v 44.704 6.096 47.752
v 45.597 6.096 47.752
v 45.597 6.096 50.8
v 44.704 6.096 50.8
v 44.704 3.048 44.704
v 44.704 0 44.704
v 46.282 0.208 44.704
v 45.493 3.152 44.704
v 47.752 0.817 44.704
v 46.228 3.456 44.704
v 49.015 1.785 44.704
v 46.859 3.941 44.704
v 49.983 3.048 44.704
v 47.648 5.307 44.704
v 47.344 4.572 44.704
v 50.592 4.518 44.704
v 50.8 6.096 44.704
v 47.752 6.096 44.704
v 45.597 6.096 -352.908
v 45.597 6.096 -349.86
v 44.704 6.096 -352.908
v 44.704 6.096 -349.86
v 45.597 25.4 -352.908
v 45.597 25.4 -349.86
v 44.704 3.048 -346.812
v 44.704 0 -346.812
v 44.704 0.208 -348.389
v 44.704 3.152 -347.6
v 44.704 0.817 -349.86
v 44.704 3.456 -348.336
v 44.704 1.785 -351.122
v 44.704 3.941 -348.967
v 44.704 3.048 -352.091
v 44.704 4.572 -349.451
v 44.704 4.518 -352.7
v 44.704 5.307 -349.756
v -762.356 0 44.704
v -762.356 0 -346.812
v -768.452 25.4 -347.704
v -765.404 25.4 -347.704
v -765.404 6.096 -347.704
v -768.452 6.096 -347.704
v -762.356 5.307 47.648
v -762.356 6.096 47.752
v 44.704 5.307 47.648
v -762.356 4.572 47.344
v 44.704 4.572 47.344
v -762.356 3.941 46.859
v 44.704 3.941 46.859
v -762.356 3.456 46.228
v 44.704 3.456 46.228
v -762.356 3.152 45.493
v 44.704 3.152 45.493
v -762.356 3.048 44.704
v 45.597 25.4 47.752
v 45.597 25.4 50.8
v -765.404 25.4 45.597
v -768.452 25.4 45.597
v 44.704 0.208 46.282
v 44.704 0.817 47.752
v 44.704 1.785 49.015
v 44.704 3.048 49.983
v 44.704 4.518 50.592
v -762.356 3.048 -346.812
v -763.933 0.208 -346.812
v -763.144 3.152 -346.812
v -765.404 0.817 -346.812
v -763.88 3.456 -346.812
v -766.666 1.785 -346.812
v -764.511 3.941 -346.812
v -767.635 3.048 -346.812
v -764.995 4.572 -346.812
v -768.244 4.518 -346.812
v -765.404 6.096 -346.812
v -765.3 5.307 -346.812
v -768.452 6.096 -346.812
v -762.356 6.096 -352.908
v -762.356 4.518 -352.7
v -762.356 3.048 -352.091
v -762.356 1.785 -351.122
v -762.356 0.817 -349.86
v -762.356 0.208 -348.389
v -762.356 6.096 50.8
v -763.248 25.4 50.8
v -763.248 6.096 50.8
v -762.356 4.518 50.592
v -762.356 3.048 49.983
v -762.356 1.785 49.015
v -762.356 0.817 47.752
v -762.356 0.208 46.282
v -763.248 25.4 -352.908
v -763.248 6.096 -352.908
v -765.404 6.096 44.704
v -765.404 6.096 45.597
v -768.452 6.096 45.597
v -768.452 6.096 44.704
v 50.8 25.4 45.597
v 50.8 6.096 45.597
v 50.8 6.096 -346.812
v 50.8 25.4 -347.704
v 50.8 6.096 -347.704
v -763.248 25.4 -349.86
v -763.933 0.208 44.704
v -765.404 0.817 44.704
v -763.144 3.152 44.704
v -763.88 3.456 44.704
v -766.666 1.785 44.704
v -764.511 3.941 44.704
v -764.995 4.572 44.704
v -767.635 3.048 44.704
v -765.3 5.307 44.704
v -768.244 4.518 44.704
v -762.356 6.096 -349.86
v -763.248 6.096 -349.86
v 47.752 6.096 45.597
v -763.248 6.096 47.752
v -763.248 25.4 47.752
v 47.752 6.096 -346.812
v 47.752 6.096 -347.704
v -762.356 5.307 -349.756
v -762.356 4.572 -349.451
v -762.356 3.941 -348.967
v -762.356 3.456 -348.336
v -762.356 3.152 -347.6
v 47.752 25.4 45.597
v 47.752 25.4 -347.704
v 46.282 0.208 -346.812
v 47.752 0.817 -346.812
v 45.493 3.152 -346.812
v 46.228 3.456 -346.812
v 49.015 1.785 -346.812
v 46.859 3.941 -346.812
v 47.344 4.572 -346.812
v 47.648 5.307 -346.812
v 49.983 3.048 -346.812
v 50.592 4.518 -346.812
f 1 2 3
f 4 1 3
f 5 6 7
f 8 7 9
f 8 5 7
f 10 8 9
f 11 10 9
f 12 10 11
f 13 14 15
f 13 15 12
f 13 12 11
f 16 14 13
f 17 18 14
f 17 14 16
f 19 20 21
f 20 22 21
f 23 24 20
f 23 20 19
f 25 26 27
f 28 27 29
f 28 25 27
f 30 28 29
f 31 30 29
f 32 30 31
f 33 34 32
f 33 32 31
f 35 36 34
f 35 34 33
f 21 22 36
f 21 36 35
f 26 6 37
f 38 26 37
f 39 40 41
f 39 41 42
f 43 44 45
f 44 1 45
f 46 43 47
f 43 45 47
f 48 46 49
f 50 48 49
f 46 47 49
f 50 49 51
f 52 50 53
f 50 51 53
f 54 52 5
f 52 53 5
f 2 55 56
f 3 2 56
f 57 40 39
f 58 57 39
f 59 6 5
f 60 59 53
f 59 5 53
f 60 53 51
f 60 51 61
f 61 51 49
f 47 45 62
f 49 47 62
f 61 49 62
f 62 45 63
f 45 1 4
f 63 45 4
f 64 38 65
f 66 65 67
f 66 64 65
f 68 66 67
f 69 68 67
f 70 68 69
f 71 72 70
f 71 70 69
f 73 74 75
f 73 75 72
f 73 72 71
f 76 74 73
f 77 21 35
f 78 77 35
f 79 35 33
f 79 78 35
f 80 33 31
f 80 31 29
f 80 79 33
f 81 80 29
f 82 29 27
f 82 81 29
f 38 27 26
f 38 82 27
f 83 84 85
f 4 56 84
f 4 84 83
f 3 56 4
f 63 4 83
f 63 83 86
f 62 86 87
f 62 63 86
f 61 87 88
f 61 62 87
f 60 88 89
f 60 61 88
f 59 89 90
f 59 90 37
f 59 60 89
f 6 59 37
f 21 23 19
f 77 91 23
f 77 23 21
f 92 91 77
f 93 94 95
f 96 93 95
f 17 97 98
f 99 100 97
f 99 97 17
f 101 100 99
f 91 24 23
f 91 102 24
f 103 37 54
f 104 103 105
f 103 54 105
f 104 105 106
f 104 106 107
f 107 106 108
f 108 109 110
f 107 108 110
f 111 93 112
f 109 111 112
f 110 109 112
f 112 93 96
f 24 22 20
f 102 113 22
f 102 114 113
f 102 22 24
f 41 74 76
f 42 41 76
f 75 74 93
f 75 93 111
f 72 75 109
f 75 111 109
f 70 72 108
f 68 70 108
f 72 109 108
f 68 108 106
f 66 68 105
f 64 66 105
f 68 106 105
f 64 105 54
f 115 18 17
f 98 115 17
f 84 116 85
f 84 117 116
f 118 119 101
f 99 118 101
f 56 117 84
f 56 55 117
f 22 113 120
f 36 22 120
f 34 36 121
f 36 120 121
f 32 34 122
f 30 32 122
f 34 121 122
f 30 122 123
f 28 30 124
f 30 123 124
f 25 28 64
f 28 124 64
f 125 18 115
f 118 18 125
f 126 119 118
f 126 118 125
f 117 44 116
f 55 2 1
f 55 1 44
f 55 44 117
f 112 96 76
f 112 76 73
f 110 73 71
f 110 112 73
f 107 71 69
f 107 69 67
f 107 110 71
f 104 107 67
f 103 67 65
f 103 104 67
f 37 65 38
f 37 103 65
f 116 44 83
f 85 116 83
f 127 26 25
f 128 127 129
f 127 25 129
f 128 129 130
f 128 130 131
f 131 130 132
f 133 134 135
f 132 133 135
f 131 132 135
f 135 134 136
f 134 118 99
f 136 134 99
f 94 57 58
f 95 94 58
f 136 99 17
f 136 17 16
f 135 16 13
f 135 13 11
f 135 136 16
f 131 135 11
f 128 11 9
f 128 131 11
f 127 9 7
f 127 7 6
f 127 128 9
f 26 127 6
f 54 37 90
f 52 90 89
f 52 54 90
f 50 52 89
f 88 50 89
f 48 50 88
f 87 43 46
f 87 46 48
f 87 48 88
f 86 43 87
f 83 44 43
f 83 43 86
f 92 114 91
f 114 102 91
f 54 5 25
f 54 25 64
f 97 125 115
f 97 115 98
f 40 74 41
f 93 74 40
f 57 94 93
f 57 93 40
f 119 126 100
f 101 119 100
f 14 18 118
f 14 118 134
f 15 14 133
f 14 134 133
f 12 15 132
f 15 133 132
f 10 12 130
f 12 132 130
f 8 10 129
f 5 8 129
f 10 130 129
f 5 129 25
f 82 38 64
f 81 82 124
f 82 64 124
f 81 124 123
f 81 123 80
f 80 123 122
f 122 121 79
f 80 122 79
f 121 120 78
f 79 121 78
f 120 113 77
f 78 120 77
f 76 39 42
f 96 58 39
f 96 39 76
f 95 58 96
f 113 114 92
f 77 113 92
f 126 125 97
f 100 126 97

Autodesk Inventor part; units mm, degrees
ref_plane "YZ Plane" through (0, 0, 0) normal (1, 0, 0) x (0, 1, 0)
ref_plane "XZ Plane" through (0, 0, 0) normal (0, 1, 0) x (-1, 0, 0)
ref_plane "XY Plane" through (0, 0, 0) normal (0, 0, 1) x (1, 0, 0)
sketch "Sketch1" plane through (0, 0, 0) normal (0, 1, 0) x (-1, 0, 0)
  line L0 (-50.8, 50.8) -> (768.4516, 50.8)
  line L1 (768.4516, 50.8) -> (768.4516, -352.9076)
  line L2 (768.4516, -352.9076) -> (-50.8, -352.9076)
  line L3 (-50.8, -352.9076) -> (-50.8, 50.8)
  dimension "d48" = 819.2516
  dimension "d49" = 403.7076
extrude "Plate1" add sketch "Sketch1" along normal blind 3.048
sketch "Sketch2" plane through (-768.4516, 0, -349.8596) normal (0, 0, -1) x (-1, 0, 0)
  line L0 (-819.2516, 0) -> (0, 0)
  line L1 (0, 0) -> (0, 25.4)
  line L2 (0, 25.4) -> (-819.2516, 25.4)
  line L3 (-819.2516, 25.4) -> (-819.2516, 0)
edge flange "Flange1" height 25.4 angle 90 thickness 3.048 bend radius 3.048 thickness toward (0, 0, -1) relief tear relief width 3.048 relief depth 1.524 corner gap 3.048 corner form 2 edges at (-358.8258, 3.048, -352.9076) (-768.4516, 3.048, -151.0538) (-358.8258, 3.048, 50.8) (50.8, 3.048, -151.0538) wall of the first edge with corners at (50.8, 0, -349.8596) (-768.4516, 0, -349.8596) (-768.4516, 25.4, -349.8596) (50.8, 25.4, -349.8596)
bend "Bend1"
corner "Corner1"
equation "\"d50\" = BendReliefWidth"
equation "\"d51\" = BendReliefDepth"
equation "\"d52\" = MinimumRemnant"
equation "\"d53\" = BendRadius"
equation "\"d56\" = BendRadius"
equation "\"d57\" = CornerReliefSize"
equation "\"d58\" = GapSize"
equation "\"d59\" = JacobiRadiusSize"
equation "\"BendRadius\" = Thickness"
equation "\"BendReliefWidth\" = Thickness"
equation "\"BendReliefDepth\" = 0.5 * Thickness"
equation "\"CornerReliefSize\" = 4 * Thickness"
equation "\"MinimumRemnant\" = 2 * Thickness"
equation "\"TransitionRadius\" = BendRadius"
equation "\"JacobiRadiusSize\" = BendRadius"
equation "\"GapSize\" = Thickness"
equation "\"d47\" = BendRadius"
equation "\"Thickness\" = 3.048"
properties part number "BellyPan Lexan" material "Polycarbonate, Clear"
